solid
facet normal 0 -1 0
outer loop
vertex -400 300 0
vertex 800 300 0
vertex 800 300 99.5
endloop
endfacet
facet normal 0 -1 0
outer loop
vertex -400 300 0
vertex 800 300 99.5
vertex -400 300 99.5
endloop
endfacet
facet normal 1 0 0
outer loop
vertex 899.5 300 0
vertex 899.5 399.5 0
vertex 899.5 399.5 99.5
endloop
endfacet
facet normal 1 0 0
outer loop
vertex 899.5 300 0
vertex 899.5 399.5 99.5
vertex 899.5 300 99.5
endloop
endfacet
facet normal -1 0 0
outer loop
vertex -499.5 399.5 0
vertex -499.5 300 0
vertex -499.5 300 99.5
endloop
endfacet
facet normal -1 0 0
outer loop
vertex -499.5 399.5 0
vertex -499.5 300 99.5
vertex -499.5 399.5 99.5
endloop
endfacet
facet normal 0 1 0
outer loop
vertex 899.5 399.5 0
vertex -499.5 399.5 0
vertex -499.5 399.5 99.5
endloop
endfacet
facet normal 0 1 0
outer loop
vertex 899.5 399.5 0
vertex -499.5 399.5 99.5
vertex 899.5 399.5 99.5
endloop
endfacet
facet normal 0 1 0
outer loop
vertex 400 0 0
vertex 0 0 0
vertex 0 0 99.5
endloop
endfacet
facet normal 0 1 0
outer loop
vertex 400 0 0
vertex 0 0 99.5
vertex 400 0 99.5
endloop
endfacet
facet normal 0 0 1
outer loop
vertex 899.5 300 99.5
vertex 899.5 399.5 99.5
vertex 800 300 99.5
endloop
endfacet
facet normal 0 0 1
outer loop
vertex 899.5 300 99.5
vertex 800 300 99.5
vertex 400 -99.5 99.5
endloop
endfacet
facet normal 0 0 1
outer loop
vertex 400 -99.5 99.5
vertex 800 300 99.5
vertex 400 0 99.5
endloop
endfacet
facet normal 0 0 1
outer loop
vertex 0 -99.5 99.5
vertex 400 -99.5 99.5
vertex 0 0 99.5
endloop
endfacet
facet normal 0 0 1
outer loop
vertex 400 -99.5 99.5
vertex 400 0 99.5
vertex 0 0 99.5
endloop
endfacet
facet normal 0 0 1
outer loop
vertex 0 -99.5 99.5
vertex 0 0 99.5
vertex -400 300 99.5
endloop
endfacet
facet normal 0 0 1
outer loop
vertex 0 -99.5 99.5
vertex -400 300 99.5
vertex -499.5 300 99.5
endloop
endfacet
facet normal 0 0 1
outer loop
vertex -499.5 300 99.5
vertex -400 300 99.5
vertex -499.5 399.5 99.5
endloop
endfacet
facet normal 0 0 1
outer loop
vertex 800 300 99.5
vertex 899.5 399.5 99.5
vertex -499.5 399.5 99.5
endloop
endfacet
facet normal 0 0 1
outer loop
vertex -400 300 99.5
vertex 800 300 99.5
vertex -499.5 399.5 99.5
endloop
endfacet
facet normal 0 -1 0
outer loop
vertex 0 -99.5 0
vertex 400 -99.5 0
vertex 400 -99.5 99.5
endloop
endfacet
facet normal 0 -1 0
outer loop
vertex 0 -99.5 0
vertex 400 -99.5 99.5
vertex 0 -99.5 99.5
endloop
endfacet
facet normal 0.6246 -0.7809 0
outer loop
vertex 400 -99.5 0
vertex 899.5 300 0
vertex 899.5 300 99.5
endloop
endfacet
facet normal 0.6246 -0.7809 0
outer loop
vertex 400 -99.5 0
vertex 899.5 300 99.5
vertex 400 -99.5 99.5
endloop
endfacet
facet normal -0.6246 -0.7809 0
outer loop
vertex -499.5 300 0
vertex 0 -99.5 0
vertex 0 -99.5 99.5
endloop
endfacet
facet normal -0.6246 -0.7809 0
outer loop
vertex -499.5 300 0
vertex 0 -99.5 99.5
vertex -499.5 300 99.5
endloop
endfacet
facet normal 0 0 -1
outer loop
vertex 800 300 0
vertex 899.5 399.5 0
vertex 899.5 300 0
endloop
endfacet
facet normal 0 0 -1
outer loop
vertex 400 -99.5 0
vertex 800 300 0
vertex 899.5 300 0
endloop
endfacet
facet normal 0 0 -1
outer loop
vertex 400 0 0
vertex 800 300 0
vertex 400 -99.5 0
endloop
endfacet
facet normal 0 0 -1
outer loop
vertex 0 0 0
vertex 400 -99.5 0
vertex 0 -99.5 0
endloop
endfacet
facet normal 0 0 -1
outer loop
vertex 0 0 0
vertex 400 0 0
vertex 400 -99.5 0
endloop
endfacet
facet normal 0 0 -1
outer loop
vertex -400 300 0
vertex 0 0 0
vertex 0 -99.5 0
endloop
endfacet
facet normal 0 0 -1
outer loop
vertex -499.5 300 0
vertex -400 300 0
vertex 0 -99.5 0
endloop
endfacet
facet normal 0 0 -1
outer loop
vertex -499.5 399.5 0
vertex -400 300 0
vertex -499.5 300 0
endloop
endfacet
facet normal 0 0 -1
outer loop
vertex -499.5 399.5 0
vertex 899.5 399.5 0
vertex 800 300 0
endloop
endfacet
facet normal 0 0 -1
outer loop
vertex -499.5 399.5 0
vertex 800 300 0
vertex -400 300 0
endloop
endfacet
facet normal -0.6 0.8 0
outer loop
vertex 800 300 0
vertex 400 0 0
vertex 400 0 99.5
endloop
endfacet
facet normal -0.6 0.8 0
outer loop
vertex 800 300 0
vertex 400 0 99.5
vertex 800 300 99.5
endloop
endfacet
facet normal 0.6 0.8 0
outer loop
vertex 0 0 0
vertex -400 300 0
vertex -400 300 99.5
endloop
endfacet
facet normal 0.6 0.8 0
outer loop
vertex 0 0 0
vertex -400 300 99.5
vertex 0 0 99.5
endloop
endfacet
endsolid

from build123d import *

# Parameters (mm, degrees)
BOSS_EXTRUDE3_DEPTH  = 99.5
SKETCH1_10_OUTSIDE_W = 1698.732
SKETCH1_10_OUTSIDE_H = 798.732
CUT_EXTRUDE2_DEPTH   = 990.242513239


with BuildPart() as part:
    # Sketch1 → Boss-Extrude3 (new body)
    with BuildSketch(Plane.XY):
        Polygon((-499.5, 399.5), (899.5, 399.5), (899.5, 300), (400, -99.5), (0, -99.5), (-499.5, 300), align=None)
    extrude(amount=BOSS_EXTRUDE3_DEPTH)

    # Sketch1<10> outside → Cut-Extrude2 (cut, through all)
    # profile 1 of 2: a face of its own
    with BuildSketch(Plane.XY):
        with Locations((200, 150)):
            Rectangle(SKETCH1_10_OUTSIDE_W, SKETCH1_10_OUTSIDE_H)
        Polygon((-499.5, 399.5), (899.5, 399.5), (899.5, 300), (400, -99.5), (0, -99.5), (-499.5, 300), align=None, mode=Mode.SUBTRACT)
    # profile 2 of 2: a face of its own
    with BuildSketch(Plane.XY):
        Polygon((0, 0), (400, 0), (800, 300), (-400, 300), align=None)
    extrude(amount=CUT_EXTRUDE2_DEPTH, mode=Mode.SUBTRACT)


solid = part.part
